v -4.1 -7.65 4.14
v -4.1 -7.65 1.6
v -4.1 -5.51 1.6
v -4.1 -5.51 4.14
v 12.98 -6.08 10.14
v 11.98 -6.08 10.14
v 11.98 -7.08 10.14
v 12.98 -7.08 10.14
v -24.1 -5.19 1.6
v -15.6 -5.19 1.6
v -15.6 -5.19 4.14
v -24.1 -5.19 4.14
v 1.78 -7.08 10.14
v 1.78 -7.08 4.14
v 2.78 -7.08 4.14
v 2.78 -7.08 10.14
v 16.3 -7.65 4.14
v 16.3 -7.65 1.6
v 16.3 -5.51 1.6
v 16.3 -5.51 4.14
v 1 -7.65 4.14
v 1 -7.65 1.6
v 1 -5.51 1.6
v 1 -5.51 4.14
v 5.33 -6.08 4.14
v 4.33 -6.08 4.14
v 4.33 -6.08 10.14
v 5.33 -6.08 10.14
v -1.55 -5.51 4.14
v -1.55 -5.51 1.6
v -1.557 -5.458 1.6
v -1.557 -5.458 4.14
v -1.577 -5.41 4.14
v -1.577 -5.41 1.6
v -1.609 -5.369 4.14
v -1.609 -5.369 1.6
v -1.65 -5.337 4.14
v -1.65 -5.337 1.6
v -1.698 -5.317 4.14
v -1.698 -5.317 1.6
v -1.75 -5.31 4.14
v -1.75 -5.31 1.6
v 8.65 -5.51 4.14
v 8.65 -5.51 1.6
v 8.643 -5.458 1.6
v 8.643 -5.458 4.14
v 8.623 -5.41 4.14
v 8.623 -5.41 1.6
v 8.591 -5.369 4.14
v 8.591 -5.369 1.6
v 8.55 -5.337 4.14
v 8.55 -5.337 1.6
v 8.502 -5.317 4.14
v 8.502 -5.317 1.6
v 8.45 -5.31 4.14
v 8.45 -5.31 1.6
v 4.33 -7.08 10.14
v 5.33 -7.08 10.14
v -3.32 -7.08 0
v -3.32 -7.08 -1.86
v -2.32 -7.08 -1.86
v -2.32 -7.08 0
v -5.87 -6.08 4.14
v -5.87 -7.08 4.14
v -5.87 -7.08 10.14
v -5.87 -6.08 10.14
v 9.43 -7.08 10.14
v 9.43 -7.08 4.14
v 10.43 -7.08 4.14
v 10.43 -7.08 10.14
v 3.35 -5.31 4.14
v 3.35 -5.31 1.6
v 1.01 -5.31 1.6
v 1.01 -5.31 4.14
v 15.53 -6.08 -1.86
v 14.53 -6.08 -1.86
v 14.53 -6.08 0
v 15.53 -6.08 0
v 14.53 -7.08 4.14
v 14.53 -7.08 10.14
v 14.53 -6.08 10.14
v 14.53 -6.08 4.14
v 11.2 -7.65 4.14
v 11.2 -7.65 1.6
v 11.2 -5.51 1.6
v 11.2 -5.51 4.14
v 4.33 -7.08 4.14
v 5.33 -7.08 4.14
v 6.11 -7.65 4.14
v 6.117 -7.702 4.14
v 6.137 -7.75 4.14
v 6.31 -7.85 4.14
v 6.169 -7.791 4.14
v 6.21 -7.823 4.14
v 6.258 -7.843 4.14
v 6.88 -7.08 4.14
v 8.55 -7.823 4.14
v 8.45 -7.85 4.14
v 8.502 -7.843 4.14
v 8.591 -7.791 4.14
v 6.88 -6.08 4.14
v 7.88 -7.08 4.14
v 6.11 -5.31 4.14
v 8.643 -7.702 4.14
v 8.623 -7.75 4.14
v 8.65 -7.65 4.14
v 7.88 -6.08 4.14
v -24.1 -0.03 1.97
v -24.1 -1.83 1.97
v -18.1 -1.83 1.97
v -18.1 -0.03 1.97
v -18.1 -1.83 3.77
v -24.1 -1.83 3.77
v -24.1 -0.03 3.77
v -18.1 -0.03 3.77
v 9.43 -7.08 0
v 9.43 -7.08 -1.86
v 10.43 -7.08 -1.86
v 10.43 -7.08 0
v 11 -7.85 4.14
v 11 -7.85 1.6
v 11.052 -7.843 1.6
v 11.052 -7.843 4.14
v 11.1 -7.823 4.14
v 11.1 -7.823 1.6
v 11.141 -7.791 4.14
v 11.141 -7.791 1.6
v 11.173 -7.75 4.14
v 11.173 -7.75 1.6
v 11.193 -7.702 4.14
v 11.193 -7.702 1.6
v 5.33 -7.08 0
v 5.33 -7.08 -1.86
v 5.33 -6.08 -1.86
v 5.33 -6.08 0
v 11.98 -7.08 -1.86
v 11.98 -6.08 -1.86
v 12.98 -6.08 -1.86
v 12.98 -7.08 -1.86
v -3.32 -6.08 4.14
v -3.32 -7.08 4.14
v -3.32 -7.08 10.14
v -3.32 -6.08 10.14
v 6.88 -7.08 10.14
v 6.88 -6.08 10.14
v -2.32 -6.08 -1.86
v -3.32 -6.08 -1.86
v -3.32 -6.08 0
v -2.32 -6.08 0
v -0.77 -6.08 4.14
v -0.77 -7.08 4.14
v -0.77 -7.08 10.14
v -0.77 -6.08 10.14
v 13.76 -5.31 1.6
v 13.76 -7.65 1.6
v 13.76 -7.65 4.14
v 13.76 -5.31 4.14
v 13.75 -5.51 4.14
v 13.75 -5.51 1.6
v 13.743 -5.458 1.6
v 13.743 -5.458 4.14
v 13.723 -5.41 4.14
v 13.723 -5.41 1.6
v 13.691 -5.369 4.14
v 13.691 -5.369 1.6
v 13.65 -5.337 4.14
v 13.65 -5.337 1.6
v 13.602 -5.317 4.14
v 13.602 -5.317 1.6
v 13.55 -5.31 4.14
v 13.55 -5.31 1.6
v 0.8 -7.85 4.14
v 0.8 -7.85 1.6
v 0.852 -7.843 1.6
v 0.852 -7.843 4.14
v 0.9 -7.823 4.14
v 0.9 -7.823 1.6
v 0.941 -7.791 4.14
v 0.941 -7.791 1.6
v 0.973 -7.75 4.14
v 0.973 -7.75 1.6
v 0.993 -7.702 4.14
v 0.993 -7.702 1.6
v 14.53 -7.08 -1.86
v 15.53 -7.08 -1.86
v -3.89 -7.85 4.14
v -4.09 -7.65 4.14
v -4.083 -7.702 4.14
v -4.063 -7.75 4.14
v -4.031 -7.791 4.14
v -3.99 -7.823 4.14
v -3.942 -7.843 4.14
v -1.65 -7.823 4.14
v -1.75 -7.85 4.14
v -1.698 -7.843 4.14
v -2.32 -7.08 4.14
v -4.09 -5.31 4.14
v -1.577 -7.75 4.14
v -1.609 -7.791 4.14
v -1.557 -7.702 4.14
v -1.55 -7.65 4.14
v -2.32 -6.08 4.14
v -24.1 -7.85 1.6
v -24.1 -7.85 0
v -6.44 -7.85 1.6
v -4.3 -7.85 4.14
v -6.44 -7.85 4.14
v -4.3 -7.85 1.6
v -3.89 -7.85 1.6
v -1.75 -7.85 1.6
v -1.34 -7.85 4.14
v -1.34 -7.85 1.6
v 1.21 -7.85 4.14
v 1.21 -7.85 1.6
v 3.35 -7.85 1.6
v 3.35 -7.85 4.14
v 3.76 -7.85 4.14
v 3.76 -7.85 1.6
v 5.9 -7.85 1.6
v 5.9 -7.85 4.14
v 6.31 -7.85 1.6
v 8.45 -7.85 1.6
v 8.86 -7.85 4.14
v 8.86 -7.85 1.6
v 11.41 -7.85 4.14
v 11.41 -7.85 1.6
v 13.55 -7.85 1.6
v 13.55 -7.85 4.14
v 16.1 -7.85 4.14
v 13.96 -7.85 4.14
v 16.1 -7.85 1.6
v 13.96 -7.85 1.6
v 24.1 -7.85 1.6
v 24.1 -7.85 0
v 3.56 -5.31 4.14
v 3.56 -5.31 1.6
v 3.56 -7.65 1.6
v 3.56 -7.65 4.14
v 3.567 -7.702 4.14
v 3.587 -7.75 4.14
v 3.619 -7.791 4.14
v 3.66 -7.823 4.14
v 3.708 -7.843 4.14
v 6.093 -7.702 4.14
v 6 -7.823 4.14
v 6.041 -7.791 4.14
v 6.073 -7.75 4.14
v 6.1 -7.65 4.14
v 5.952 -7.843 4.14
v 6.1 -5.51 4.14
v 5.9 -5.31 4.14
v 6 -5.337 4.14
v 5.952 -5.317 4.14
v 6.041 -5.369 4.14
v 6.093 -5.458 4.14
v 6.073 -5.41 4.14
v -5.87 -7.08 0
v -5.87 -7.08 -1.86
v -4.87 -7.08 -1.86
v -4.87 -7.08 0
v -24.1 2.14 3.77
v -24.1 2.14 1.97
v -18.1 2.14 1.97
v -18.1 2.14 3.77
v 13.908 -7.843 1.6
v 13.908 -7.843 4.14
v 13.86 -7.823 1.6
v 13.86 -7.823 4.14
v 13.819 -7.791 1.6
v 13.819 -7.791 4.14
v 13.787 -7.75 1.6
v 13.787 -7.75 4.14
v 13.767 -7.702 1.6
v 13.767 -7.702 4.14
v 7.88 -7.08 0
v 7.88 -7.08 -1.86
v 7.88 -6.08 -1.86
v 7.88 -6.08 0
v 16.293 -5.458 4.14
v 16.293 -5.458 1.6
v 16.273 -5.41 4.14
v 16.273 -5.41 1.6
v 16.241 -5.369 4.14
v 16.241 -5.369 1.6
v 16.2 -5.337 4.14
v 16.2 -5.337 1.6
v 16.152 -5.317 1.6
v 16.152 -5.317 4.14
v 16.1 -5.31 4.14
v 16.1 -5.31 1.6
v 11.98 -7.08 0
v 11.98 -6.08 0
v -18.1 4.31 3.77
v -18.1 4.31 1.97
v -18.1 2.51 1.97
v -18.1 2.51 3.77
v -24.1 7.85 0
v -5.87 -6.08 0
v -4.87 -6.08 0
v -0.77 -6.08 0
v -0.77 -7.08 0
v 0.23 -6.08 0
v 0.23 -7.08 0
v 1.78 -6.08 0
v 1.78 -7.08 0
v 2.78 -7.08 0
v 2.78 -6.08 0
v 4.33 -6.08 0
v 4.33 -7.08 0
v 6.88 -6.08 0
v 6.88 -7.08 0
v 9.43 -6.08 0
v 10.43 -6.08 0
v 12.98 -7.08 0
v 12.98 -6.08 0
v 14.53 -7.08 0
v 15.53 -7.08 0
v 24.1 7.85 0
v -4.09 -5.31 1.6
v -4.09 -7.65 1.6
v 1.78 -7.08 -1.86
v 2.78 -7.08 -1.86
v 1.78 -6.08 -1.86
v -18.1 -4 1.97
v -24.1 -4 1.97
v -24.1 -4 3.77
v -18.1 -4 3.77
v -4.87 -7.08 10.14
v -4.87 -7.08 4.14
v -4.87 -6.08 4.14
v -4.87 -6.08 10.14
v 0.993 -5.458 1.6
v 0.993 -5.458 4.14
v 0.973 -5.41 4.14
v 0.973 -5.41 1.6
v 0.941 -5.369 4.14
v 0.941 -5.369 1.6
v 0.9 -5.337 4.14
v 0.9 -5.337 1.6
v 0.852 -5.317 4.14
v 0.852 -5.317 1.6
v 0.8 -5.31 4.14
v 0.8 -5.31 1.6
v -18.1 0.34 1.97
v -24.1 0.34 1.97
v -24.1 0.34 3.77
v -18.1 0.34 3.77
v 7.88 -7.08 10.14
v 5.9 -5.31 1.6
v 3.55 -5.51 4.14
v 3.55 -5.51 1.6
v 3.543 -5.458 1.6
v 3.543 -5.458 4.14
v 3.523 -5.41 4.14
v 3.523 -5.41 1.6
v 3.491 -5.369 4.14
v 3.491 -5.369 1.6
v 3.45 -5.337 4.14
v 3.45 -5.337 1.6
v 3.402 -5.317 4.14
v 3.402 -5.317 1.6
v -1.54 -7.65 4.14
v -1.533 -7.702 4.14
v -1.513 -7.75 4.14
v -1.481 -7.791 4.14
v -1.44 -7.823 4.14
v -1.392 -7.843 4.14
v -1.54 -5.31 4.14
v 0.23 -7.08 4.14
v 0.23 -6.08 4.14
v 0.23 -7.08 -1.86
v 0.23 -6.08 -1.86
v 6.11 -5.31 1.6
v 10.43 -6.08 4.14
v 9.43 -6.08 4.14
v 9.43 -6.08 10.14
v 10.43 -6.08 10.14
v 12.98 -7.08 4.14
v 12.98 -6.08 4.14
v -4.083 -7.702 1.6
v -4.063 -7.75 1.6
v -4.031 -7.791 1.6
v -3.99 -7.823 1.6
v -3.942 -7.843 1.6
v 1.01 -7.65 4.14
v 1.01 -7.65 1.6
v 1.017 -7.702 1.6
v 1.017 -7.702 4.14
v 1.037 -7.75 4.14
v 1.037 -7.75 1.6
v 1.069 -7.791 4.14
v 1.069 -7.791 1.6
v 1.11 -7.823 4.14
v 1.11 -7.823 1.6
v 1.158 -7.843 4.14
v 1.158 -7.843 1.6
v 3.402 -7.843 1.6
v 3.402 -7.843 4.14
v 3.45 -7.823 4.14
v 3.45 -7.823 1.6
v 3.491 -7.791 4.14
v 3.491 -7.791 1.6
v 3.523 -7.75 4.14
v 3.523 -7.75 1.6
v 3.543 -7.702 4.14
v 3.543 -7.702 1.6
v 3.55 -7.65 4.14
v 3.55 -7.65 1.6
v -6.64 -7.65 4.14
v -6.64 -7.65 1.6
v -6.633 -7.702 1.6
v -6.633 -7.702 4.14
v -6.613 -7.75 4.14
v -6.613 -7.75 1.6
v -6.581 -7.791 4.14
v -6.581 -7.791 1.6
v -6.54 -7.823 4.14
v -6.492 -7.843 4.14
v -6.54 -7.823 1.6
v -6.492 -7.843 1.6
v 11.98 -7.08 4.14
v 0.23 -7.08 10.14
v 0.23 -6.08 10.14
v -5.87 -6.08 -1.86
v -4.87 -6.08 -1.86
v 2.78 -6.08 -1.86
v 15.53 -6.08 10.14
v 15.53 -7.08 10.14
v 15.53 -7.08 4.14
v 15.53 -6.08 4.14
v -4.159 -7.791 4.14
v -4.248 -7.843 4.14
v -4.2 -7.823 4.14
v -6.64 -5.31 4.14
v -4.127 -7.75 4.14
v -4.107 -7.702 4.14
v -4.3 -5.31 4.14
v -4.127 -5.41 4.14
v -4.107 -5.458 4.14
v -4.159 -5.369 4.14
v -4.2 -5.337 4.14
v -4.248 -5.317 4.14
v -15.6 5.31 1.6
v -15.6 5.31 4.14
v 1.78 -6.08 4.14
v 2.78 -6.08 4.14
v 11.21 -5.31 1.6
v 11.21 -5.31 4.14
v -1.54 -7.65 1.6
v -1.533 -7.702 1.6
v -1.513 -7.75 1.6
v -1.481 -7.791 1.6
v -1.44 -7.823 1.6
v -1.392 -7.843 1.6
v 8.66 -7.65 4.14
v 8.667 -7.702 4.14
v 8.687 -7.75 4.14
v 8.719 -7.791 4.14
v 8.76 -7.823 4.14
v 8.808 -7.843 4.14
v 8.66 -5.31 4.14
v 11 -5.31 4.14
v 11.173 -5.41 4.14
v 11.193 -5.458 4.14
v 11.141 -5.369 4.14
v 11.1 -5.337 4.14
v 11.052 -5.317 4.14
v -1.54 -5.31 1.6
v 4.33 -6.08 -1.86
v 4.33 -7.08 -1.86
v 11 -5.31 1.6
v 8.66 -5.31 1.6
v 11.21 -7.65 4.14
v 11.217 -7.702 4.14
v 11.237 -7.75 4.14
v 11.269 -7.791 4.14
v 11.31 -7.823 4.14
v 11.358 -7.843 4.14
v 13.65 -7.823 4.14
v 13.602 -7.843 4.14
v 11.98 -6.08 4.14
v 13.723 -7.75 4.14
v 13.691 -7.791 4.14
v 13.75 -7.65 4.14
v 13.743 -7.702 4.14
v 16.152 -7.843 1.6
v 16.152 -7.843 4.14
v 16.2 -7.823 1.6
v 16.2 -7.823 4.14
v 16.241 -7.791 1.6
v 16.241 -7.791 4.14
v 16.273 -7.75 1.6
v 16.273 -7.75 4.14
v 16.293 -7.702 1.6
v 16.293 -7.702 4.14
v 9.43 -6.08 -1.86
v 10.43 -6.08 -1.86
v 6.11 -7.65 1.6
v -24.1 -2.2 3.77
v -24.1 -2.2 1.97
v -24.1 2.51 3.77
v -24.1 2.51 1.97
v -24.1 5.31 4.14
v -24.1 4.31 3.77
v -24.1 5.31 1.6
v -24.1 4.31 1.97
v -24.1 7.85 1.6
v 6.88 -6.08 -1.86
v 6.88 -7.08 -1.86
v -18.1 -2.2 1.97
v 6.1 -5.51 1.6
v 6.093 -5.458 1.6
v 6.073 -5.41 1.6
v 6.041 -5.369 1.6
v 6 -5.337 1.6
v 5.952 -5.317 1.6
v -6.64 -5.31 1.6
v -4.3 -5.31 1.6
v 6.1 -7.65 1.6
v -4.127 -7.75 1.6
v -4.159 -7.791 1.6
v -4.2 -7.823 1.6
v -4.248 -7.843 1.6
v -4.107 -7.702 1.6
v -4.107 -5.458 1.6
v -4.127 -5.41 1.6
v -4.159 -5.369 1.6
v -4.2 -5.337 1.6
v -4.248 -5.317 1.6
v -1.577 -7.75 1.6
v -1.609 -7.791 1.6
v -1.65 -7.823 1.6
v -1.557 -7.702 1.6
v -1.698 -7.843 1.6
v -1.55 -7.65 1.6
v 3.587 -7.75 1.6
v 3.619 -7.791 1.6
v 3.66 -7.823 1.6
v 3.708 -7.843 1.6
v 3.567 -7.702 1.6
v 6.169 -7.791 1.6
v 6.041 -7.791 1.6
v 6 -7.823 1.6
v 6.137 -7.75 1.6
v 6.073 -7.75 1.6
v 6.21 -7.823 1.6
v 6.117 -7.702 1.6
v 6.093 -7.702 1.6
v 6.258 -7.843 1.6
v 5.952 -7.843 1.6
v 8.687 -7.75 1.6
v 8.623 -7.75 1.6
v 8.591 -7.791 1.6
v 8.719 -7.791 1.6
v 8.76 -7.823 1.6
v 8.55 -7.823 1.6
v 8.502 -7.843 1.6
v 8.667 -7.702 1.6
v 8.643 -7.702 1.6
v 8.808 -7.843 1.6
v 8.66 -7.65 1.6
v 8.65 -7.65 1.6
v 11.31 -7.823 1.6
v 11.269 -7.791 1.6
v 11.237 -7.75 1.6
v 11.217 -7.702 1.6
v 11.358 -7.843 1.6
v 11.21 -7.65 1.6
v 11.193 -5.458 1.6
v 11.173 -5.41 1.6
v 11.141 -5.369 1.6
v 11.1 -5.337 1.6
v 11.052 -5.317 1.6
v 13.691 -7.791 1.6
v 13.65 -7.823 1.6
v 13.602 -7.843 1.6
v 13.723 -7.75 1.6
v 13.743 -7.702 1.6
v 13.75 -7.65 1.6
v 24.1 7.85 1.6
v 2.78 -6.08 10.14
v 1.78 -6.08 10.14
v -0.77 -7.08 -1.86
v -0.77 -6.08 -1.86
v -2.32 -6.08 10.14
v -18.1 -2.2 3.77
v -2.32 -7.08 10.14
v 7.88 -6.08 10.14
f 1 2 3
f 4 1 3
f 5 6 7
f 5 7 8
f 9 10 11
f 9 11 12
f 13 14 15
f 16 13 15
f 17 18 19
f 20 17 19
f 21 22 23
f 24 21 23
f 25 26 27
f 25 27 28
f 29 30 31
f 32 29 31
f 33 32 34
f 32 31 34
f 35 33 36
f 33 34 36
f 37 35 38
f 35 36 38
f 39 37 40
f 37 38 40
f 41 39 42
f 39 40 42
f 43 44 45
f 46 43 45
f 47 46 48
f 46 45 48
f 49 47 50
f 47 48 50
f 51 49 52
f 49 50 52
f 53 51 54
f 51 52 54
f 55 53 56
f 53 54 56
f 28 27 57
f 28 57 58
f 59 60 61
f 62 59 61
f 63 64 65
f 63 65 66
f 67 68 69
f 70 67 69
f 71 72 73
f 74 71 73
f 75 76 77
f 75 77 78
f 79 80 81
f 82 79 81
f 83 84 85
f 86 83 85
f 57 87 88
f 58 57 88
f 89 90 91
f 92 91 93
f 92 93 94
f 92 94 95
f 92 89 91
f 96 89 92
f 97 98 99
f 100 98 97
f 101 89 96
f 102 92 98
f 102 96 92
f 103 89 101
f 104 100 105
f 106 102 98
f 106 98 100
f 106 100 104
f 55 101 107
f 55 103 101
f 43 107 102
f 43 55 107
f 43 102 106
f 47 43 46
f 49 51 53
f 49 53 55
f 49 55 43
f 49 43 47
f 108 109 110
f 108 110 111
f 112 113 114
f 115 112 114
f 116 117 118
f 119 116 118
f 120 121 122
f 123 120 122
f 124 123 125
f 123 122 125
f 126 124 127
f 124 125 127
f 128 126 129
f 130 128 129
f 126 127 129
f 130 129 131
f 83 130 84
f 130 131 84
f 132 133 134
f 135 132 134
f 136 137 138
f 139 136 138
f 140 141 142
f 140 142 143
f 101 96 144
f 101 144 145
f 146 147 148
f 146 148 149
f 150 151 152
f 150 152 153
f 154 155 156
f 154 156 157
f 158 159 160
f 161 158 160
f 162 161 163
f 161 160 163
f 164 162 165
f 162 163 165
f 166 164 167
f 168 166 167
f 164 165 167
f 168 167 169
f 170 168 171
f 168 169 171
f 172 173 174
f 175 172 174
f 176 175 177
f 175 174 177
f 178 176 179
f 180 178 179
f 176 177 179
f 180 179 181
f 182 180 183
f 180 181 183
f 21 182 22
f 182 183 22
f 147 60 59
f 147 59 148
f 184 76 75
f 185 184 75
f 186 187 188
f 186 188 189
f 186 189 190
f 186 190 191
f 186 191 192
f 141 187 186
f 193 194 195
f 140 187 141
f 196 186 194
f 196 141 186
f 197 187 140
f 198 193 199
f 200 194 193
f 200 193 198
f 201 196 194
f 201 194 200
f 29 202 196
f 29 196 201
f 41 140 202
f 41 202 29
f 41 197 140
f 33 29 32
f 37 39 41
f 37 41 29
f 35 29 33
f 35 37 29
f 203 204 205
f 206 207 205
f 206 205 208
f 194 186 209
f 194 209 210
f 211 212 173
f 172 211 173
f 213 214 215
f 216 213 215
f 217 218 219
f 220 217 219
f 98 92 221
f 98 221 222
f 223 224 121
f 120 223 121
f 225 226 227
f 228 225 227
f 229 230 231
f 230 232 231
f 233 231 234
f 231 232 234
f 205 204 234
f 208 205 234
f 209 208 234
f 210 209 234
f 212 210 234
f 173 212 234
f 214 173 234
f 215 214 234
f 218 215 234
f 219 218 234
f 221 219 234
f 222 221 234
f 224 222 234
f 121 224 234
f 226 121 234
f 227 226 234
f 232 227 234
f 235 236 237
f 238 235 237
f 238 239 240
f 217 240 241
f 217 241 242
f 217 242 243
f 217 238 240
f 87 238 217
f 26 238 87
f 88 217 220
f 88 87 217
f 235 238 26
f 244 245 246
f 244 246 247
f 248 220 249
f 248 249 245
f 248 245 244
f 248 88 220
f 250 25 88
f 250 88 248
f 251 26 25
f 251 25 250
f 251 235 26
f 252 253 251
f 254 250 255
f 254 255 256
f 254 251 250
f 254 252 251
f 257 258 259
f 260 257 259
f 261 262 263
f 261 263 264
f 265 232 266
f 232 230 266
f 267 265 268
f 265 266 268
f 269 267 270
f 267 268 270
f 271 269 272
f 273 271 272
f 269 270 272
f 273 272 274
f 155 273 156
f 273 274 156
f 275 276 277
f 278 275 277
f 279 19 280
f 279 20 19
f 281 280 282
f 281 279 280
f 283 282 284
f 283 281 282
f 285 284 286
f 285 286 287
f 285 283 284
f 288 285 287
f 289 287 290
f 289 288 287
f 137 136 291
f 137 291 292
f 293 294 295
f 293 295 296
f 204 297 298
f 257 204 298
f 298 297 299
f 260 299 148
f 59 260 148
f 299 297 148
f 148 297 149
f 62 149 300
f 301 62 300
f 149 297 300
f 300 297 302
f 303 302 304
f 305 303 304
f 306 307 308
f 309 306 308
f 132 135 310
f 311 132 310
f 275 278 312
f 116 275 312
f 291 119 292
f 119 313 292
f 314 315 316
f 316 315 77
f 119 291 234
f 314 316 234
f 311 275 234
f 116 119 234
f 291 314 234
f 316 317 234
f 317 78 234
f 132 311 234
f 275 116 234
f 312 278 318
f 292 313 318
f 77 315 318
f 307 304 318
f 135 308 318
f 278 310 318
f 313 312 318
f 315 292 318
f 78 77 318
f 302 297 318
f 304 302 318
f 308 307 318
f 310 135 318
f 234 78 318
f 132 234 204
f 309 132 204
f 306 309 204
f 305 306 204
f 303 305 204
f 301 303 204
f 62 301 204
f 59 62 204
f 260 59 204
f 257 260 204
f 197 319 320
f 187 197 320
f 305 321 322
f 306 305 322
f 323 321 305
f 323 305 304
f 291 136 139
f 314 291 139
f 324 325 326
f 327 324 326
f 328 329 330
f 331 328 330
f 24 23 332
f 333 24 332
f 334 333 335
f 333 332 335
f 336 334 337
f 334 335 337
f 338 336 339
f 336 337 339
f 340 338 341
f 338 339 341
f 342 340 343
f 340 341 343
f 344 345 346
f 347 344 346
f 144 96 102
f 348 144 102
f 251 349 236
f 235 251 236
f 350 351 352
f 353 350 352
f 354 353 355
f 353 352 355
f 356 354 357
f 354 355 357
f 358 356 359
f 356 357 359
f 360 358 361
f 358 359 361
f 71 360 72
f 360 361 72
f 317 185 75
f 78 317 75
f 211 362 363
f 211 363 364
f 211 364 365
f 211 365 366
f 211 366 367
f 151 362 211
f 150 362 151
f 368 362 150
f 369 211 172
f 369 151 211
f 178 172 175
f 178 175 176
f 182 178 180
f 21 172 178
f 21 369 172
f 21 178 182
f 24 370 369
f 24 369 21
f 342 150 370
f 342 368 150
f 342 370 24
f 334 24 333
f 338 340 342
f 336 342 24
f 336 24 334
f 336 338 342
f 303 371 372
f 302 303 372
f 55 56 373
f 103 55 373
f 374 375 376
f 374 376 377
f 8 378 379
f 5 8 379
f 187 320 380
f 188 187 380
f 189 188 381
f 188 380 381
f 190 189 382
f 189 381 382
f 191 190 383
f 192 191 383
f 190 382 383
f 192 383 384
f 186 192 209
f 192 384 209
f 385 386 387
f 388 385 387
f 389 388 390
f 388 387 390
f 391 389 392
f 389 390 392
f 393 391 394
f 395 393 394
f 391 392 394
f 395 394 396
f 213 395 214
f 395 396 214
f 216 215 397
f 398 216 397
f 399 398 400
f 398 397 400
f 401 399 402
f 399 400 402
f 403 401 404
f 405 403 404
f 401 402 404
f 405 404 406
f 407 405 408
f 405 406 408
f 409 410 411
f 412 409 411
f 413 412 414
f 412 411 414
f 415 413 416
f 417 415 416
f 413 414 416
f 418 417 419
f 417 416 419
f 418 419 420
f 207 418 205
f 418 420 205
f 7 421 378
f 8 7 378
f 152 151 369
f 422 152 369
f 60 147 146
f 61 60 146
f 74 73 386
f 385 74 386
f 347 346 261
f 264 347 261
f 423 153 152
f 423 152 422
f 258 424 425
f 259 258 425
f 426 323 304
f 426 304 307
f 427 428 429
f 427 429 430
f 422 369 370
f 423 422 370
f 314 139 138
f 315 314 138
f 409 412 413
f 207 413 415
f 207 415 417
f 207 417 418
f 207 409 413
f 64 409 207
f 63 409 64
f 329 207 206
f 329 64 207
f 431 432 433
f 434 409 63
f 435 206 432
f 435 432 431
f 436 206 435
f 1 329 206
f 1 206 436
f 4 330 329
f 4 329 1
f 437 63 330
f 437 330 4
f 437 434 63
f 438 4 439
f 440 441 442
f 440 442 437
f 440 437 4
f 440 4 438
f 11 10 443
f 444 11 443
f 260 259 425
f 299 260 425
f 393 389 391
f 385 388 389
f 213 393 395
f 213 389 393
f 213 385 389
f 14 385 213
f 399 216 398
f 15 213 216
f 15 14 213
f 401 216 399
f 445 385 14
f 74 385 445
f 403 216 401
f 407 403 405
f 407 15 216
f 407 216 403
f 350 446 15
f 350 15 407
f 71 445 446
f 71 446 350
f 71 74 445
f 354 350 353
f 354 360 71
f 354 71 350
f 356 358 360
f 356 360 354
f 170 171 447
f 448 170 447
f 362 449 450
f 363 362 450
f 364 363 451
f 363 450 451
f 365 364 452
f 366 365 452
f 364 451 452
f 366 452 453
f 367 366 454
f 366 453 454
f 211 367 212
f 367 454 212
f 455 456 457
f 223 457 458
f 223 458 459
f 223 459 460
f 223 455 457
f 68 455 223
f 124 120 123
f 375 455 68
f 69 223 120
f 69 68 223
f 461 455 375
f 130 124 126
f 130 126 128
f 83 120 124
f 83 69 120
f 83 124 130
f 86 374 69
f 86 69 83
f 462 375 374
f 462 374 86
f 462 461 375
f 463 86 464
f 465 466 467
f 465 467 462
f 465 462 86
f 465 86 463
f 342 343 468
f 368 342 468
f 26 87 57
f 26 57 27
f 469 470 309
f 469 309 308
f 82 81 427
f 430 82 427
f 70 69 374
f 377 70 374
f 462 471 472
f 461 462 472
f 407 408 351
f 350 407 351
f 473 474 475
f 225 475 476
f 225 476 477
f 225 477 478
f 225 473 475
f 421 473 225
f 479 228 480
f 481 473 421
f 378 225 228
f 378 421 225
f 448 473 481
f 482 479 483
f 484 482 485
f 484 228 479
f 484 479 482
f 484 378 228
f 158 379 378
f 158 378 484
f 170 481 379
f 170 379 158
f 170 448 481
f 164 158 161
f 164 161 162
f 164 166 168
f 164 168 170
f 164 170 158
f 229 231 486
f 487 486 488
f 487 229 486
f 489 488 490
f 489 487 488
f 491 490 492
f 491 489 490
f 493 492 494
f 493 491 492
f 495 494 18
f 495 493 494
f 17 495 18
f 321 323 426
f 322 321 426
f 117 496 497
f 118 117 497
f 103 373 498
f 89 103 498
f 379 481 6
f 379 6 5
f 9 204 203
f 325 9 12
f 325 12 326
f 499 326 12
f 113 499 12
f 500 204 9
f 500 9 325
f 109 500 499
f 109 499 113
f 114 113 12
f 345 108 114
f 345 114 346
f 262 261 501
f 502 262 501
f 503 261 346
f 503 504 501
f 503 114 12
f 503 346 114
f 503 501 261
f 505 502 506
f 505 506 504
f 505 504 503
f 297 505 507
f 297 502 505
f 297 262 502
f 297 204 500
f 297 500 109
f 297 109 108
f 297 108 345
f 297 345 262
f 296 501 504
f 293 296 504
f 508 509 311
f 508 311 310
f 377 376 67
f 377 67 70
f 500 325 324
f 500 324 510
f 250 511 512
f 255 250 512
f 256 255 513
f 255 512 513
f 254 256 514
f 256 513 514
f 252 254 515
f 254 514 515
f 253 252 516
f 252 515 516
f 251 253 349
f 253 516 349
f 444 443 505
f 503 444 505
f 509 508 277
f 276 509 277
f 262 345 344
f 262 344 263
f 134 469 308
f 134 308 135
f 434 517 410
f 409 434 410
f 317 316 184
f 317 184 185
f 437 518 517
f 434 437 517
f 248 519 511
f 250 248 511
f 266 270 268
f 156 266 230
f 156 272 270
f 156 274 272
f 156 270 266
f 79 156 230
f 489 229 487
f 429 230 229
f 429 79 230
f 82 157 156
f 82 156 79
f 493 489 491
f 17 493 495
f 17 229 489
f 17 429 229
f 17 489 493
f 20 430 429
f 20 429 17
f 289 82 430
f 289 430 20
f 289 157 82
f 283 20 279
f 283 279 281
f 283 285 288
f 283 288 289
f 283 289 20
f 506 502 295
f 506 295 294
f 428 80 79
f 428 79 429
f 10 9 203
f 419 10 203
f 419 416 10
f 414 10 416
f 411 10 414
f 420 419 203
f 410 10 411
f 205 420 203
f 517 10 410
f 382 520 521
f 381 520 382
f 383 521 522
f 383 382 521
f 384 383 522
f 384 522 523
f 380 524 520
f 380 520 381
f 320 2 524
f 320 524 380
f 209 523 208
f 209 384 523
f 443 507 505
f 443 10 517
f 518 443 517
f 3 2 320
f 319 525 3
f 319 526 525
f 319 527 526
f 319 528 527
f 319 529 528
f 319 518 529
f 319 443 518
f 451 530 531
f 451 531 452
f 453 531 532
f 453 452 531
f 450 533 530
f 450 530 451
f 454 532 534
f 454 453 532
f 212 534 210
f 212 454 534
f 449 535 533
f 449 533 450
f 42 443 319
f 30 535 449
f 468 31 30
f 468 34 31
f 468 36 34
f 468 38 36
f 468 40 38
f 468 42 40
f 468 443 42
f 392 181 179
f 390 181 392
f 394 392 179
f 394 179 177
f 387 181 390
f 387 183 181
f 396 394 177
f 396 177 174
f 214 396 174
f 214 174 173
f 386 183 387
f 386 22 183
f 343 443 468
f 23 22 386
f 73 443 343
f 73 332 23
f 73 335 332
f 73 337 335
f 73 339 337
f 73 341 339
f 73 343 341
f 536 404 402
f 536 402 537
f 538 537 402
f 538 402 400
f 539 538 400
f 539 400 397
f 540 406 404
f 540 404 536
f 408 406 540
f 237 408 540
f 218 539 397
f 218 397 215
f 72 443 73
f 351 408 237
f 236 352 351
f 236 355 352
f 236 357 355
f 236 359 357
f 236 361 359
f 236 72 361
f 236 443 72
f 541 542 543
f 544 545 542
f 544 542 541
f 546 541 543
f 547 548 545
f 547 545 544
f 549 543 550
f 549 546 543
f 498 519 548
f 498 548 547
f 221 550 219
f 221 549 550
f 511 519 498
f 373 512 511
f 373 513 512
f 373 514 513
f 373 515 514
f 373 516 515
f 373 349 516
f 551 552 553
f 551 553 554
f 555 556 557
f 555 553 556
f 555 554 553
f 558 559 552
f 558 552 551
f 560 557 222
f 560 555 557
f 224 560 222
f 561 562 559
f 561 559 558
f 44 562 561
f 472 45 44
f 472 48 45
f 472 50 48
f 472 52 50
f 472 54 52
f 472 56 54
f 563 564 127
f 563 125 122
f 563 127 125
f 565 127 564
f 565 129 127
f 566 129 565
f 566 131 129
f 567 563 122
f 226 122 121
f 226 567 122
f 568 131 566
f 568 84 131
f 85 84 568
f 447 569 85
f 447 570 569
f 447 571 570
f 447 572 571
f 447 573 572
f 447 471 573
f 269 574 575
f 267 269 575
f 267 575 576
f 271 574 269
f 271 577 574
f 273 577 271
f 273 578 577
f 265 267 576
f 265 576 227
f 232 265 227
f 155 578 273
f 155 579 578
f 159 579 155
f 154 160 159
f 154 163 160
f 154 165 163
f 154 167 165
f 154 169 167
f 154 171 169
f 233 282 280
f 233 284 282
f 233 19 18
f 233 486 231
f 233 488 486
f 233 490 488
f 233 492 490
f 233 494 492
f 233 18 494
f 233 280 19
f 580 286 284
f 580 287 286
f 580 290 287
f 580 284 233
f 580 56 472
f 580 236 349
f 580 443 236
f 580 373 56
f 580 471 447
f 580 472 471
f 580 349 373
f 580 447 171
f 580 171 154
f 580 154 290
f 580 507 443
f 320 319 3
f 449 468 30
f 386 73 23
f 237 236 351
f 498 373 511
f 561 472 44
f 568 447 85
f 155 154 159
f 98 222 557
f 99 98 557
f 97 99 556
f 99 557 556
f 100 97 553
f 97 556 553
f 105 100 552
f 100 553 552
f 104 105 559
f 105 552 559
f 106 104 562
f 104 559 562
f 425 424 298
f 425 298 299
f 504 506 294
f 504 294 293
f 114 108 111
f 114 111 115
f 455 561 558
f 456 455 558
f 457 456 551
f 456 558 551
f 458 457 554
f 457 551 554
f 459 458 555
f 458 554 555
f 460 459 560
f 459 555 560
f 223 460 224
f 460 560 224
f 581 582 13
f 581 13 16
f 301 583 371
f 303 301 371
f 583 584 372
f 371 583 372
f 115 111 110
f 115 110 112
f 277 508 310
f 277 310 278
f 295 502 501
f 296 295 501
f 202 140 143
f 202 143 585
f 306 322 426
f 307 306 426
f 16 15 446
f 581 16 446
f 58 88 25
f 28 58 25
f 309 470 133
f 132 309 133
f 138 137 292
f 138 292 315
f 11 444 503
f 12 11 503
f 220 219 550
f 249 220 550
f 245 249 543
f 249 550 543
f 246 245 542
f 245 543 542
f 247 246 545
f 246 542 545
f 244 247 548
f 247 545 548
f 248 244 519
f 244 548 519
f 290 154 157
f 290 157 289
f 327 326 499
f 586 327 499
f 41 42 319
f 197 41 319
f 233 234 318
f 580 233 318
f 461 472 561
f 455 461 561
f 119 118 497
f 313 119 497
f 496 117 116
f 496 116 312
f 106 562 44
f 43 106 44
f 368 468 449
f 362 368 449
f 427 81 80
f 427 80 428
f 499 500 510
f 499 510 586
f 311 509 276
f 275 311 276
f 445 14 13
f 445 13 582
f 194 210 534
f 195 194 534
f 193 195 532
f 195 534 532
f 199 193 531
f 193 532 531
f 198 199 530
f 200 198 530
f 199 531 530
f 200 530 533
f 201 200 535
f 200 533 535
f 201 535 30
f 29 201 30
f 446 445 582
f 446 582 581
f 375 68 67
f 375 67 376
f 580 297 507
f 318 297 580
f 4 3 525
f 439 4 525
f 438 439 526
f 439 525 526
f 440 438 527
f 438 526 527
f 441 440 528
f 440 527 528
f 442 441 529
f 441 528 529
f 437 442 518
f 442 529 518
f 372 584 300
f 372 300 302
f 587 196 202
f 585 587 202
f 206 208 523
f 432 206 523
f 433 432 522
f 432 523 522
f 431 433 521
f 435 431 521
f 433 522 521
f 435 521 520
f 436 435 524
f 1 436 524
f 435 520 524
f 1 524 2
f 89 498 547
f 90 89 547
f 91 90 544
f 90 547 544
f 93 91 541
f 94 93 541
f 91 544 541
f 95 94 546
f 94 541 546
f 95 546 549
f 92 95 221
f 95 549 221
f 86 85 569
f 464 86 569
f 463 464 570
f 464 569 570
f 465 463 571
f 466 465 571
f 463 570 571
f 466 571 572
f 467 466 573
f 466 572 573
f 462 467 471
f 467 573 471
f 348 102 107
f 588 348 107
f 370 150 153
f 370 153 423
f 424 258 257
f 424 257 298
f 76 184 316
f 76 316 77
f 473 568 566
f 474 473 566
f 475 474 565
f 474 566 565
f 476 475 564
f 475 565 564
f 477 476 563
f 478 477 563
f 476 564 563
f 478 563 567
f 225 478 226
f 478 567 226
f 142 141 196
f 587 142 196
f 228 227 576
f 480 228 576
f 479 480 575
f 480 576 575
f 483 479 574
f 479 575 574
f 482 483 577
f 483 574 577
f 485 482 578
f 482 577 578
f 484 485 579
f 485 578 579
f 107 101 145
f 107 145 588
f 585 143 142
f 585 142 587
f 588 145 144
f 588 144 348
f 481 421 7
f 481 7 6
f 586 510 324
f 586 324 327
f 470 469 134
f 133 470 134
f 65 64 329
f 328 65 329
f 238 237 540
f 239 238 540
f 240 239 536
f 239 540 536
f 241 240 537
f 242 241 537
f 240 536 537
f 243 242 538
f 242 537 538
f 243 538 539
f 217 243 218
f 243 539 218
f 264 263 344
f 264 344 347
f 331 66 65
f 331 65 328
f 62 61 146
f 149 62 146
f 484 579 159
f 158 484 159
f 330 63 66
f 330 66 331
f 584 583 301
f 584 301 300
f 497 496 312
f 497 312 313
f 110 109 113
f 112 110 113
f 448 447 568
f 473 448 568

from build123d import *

# Parameters (mm, degrees)
SKETCH1_W             = 48.2
SKETCH1_H             = 15.7
MAIN_DEPTH            = 1.6
SKETCH2_W             = 2.54
SKETCH2_H             = 2.54
PINBASE_DEPTH         = 2.54
FILLET1_R             = 0.2
SKETCH3_W             = 1
SKETCH3_H             = 1
BOSS_EXTRUDE3_DEPTH   = 6
LPATTERN3_START       = 1.6
LPATTERN3_DEPTH       = 2.54
LPATTERN3_START_2     = -1.86
LPATTERN3_2_OUTLINE_W = 1
LPATTERN3_2_OUTLINE_H = 1
LPATTERN3_2_DEPTH     = 12
SKETCH5_W             = 8.5
SKETCH5_H             = 10.5
BOSS_EXTRUDE4_DEPTH   = 2.54
SKETCH6_W             = 1.8
SKETCH6_H             = 1.8
CUT_EXTRUDE1_DEPTH    = 6


# Read off the part's stored shape, not the designer's step: LPattern3
with BuildPart() as part:
    # Sketch1 → Main (new body)
    with BuildSketch(Plane.XY):
        Rectangle(SKETCH1_W, SKETCH1_H)
    extrude(amount=MAIN_DEPTH)

    # Sketch2 → PinBase (add)
    with BuildSketch(Plane.XY.offset(1.6)):
        with Locations((15.03, -6.58)):
            Rectangle(SKETCH2_W, SKETCH2_H)
    extrude(amount=PINBASE_DEPTH)

    # Fillet1
    fillet1_edges = [part.edges().sort_by_distance(p)[0] for p in [
        (13.76, -7.85, 2.87),
        (16.3, -7.85, 2.87),
        (16.3, -5.31, 2.87),
    ]]
    fillet(fillet1_edges, radius=FILLET1_R)

    # Sketch3 → Boss-Extrude3 (add, symmetric)
    with BuildSketch(Plane.XY.offset(4.14)):
        with Locations((15.03, -6.58)):
            Rectangle(SKETCH3_W, SKETCH3_H)
    extrude(amount=BOSS_EXTRUDE3_DEPTH, both=True)

    # LPattern3 outline → LPattern3 (add)
    with BuildSketch(Plane.XY.offset(LPATTERN3_START)):
        with BuildLine():
            Line((-6.44, -7.85), (-4.3, -7.85))
            ThreePointArc((-4.3, -7.85), (-4.158578644, -7.791421356), (-4.1, -7.65))
            Line((-4.1, -7.65), (-4.1, -5.51))
            ThreePointArc((-4.1, -5.51), (-4.158578644, -5.368578644), (-4.3, -5.31))
            Line((-4.3, -5.31), (-6.64, -5.31))
            Line((-6.64, -5.31), (-6.64, -7.65))
            ThreePointArc((-6.64, -7.65), (-6.581421356, -7.791421356), (-6.44, -7.85))
        make_face()
        with BuildLine():
            Line((-3.89, -7.85), (-1.75, -7.85))
            ThreePointArc((-1.75, -7.85), (-1.608578644, -7.791421356), (-1.55, -7.65))
            Line((-1.55, -7.65), (-1.55, -5.51))
            ThreePointArc((-1.55, -5.51), (-1.608578644, -5.368578644), (-1.75, -5.31))
            Line((-1.75, -5.31), (-4.09, -5.31))
            Line((-4.09, -5.31), (-4.09, -7.65))
            ThreePointArc((-4.09, -7.65), (-4.031421356, -7.791421356), (-3.89, -7.85))
        make_face()
        with BuildLine():
            Line((-1.34, -7.85), (0.8, -7.85))
            ThreePointArc((0.8, -7.85), (0.941421356, -7.791421356), (1, -7.65))
            Line((1, -7.65), (1, -5.51))
            ThreePointArc((1, -5.51), (0.941421356, -5.368578644), (0.8, -5.31))
            Line((0.8, -5.31), (-1.54, -5.31))
            Line((-1.54, -5.31), (-1.54, -7.65))
            ThreePointArc((-1.54, -7.65), (-1.481421356, -7.791421356), (-1.34, -7.85))
        make_face()
        with BuildLine():
            Line((1.21, -7.85), (3.35, -7.85))
            ThreePointArc((3.35, -7.85), (3.491421356, -7.791421356), (3.55, -7.65))
            Line((3.55, -7.65), (3.55, -5.51))
            ThreePointArc((3.55, -5.51), (3.491421356, -5.368578644), (3.35, -5.31))
            Line((3.35, -5.31), (1.01, -5.31))
            Line((1.01, -5.31), (1.01, -7.65))
            ThreePointArc((1.01, -7.65), (1.068578644, -7.791421356), (1.21, -7.85))
        make_face()
        with BuildLine():
            Line((3.76, -7.85), (5.9, -7.85))
            ThreePointArc((5.9, -7.85), (6.041421356, -7.791421356), (6.1, -7.65))
            Line((6.1, -7.65), (6.1, -5.51))
            ThreePointArc((6.1, -5.51), (6.041421356, -5.368578644), (5.9, -5.31))
            Line((5.9, -5.31), (3.56, -5.31))
            Line((3.56, -5.31), (3.56, -7.65))
            ThreePointArc((3.56, -7.65), (3.618578644, -7.791421356), (3.76, -7.85))
        make_face()
        with BuildLine():
            Line((6.31, -7.85), (8.45, -7.85))
            ThreePointArc((8.45, -7.85), (8.591421356, -7.791421356), (8.65, -7.65))
            Line((8.65, -7.65), (8.65, -5.51))
            ThreePointArc((8.65, -5.51), (8.591421356, -5.368578644), (8.45, -5.31))
            Line((8.45, -5.31), (6.11, -5.31))
            Line((6.11, -5.31), (6.11, -7.65))
            ThreePointArc((6.11, -7.65), (6.168578644, -7.791421356), (6.31, -7.85))
        make_face()
        with BuildLine():
            Line((8.86, -7.85), (11, -7.85))
            ThreePointArc((11, -7.85), (11.141421356, -7.791421356), (11.2, -7.65))
            Line((11.2, -7.65), (11.2, -5.51))
            ThreePointArc((11.2, -5.51), (11.141421356, -5.368578644), (11, -5.31))
            Line((11, -5.31), (8.66, -5.31))
            Line((8.66, -5.31), (8.66, -7.65))
            ThreePointArc((8.66, -7.65), (8.718578644, -7.791421356), (8.86, -7.85))
        make_face()
        with BuildLine():
            Line((11.41, -7.85), (13.55, -7.85))
            ThreePointArc((13.55, -7.85), (13.691421356, -7.791421356), (13.75, -7.65))
            Line((13.75, -7.65), (13.75, -5.51))
            ThreePointArc((13.75, -5.51), (13.691421356, -5.368578644), (13.55, -5.31))
            Line((13.55, -5.31), (11.21, -5.31))
            Line((11.21, -5.31), (11.21, -7.65))
            ThreePointArc((11.21, -7.65), (11.268578644, -7.791421356), (11.41, -7.85))
        make_face()
    extrude(amount=LPATTERN3_DEPTH)

    # LPattern3 2 outline → LPattern3 2 (add)
    with BuildSketch(Plane.XY.offset(LPATTERN3_START_2)):
        with Locations((12.48, -6.58)):
            Rectangle(LPATTERN3_2_OUTLINE_W, LPATTERN3_2_OUTLINE_H)
        with Locations((9.93, -6.58)):
            Rectangle(LPATTERN3_2_OUTLINE_W, LPATTERN3_2_OUTLINE_H)
        with Locations((7.38, -6.58)):
            Rectangle(LPATTERN3_2_OUTLINE_W, LPATTERN3_2_OUTLINE_H)
        with Locations((4.83, -6.58)):
            Rectangle(LPATTERN3_2_OUTLINE_W, LPATTERN3_2_OUTLINE_H)
        with Locations((2.28, -6.58)):
            Rectangle(LPATTERN3_2_OUTLINE_W, LPATTERN3_2_OUTLINE_H)
        with Locations((-0.27, -6.58)):
            Rectangle(LPATTERN3_2_OUTLINE_W, LPATTERN3_2_OUTLINE_H)
        with Locations((-2.82, -6.58)):
            Rectangle(LPATTERN3_2_OUTLINE_W, LPATTERN3_2_OUTLINE_H)
        with Locations((-5.37, -6.58)):
            Rectangle(LPATTERN3_2_OUTLINE_W, LPATTERN3_2_OUTLINE_H)
    extrude(amount=LPATTERN3_2_DEPTH)

    # Sketch5 → Boss-Extrude4 (add)
    with BuildSketch(Plane(origin=(-48.2, 0, 1.6), x_dir=(-1, 0, 0), z_dir=(0, 0, -1))):
        with Locations((-28.35, 0.06)):
            Rectangle(SKETCH5_W, SKETCH5_H)
    extrude(amount=-BOSS_EXTRUDE4_DEPTH)

    # Sketch6 → Cut-Extrude1 (cut)
    with BuildSketch(Plane.ZY.offset(24.1)):
        with Locations((2.87, 3.41)):
            Rectangle(SKETCH6_W, SKETCH6_H)
        with Locations((2.87, 1.24)):
            Rectangle(SKETCH6_W, SKETCH6_H)
        with Locations((2.87, -0.93)):
            Rectangle(SKETCH6_W, SKETCH6_H)
        with Locations((2.87, -3.1)):
            Rectangle(SKETCH6_W, SKETCH6_H)
    extrude(amount=-CUT_EXTRUDE1_DEPTH, mode=Mode.SUBTRACT)


solid = part.part
